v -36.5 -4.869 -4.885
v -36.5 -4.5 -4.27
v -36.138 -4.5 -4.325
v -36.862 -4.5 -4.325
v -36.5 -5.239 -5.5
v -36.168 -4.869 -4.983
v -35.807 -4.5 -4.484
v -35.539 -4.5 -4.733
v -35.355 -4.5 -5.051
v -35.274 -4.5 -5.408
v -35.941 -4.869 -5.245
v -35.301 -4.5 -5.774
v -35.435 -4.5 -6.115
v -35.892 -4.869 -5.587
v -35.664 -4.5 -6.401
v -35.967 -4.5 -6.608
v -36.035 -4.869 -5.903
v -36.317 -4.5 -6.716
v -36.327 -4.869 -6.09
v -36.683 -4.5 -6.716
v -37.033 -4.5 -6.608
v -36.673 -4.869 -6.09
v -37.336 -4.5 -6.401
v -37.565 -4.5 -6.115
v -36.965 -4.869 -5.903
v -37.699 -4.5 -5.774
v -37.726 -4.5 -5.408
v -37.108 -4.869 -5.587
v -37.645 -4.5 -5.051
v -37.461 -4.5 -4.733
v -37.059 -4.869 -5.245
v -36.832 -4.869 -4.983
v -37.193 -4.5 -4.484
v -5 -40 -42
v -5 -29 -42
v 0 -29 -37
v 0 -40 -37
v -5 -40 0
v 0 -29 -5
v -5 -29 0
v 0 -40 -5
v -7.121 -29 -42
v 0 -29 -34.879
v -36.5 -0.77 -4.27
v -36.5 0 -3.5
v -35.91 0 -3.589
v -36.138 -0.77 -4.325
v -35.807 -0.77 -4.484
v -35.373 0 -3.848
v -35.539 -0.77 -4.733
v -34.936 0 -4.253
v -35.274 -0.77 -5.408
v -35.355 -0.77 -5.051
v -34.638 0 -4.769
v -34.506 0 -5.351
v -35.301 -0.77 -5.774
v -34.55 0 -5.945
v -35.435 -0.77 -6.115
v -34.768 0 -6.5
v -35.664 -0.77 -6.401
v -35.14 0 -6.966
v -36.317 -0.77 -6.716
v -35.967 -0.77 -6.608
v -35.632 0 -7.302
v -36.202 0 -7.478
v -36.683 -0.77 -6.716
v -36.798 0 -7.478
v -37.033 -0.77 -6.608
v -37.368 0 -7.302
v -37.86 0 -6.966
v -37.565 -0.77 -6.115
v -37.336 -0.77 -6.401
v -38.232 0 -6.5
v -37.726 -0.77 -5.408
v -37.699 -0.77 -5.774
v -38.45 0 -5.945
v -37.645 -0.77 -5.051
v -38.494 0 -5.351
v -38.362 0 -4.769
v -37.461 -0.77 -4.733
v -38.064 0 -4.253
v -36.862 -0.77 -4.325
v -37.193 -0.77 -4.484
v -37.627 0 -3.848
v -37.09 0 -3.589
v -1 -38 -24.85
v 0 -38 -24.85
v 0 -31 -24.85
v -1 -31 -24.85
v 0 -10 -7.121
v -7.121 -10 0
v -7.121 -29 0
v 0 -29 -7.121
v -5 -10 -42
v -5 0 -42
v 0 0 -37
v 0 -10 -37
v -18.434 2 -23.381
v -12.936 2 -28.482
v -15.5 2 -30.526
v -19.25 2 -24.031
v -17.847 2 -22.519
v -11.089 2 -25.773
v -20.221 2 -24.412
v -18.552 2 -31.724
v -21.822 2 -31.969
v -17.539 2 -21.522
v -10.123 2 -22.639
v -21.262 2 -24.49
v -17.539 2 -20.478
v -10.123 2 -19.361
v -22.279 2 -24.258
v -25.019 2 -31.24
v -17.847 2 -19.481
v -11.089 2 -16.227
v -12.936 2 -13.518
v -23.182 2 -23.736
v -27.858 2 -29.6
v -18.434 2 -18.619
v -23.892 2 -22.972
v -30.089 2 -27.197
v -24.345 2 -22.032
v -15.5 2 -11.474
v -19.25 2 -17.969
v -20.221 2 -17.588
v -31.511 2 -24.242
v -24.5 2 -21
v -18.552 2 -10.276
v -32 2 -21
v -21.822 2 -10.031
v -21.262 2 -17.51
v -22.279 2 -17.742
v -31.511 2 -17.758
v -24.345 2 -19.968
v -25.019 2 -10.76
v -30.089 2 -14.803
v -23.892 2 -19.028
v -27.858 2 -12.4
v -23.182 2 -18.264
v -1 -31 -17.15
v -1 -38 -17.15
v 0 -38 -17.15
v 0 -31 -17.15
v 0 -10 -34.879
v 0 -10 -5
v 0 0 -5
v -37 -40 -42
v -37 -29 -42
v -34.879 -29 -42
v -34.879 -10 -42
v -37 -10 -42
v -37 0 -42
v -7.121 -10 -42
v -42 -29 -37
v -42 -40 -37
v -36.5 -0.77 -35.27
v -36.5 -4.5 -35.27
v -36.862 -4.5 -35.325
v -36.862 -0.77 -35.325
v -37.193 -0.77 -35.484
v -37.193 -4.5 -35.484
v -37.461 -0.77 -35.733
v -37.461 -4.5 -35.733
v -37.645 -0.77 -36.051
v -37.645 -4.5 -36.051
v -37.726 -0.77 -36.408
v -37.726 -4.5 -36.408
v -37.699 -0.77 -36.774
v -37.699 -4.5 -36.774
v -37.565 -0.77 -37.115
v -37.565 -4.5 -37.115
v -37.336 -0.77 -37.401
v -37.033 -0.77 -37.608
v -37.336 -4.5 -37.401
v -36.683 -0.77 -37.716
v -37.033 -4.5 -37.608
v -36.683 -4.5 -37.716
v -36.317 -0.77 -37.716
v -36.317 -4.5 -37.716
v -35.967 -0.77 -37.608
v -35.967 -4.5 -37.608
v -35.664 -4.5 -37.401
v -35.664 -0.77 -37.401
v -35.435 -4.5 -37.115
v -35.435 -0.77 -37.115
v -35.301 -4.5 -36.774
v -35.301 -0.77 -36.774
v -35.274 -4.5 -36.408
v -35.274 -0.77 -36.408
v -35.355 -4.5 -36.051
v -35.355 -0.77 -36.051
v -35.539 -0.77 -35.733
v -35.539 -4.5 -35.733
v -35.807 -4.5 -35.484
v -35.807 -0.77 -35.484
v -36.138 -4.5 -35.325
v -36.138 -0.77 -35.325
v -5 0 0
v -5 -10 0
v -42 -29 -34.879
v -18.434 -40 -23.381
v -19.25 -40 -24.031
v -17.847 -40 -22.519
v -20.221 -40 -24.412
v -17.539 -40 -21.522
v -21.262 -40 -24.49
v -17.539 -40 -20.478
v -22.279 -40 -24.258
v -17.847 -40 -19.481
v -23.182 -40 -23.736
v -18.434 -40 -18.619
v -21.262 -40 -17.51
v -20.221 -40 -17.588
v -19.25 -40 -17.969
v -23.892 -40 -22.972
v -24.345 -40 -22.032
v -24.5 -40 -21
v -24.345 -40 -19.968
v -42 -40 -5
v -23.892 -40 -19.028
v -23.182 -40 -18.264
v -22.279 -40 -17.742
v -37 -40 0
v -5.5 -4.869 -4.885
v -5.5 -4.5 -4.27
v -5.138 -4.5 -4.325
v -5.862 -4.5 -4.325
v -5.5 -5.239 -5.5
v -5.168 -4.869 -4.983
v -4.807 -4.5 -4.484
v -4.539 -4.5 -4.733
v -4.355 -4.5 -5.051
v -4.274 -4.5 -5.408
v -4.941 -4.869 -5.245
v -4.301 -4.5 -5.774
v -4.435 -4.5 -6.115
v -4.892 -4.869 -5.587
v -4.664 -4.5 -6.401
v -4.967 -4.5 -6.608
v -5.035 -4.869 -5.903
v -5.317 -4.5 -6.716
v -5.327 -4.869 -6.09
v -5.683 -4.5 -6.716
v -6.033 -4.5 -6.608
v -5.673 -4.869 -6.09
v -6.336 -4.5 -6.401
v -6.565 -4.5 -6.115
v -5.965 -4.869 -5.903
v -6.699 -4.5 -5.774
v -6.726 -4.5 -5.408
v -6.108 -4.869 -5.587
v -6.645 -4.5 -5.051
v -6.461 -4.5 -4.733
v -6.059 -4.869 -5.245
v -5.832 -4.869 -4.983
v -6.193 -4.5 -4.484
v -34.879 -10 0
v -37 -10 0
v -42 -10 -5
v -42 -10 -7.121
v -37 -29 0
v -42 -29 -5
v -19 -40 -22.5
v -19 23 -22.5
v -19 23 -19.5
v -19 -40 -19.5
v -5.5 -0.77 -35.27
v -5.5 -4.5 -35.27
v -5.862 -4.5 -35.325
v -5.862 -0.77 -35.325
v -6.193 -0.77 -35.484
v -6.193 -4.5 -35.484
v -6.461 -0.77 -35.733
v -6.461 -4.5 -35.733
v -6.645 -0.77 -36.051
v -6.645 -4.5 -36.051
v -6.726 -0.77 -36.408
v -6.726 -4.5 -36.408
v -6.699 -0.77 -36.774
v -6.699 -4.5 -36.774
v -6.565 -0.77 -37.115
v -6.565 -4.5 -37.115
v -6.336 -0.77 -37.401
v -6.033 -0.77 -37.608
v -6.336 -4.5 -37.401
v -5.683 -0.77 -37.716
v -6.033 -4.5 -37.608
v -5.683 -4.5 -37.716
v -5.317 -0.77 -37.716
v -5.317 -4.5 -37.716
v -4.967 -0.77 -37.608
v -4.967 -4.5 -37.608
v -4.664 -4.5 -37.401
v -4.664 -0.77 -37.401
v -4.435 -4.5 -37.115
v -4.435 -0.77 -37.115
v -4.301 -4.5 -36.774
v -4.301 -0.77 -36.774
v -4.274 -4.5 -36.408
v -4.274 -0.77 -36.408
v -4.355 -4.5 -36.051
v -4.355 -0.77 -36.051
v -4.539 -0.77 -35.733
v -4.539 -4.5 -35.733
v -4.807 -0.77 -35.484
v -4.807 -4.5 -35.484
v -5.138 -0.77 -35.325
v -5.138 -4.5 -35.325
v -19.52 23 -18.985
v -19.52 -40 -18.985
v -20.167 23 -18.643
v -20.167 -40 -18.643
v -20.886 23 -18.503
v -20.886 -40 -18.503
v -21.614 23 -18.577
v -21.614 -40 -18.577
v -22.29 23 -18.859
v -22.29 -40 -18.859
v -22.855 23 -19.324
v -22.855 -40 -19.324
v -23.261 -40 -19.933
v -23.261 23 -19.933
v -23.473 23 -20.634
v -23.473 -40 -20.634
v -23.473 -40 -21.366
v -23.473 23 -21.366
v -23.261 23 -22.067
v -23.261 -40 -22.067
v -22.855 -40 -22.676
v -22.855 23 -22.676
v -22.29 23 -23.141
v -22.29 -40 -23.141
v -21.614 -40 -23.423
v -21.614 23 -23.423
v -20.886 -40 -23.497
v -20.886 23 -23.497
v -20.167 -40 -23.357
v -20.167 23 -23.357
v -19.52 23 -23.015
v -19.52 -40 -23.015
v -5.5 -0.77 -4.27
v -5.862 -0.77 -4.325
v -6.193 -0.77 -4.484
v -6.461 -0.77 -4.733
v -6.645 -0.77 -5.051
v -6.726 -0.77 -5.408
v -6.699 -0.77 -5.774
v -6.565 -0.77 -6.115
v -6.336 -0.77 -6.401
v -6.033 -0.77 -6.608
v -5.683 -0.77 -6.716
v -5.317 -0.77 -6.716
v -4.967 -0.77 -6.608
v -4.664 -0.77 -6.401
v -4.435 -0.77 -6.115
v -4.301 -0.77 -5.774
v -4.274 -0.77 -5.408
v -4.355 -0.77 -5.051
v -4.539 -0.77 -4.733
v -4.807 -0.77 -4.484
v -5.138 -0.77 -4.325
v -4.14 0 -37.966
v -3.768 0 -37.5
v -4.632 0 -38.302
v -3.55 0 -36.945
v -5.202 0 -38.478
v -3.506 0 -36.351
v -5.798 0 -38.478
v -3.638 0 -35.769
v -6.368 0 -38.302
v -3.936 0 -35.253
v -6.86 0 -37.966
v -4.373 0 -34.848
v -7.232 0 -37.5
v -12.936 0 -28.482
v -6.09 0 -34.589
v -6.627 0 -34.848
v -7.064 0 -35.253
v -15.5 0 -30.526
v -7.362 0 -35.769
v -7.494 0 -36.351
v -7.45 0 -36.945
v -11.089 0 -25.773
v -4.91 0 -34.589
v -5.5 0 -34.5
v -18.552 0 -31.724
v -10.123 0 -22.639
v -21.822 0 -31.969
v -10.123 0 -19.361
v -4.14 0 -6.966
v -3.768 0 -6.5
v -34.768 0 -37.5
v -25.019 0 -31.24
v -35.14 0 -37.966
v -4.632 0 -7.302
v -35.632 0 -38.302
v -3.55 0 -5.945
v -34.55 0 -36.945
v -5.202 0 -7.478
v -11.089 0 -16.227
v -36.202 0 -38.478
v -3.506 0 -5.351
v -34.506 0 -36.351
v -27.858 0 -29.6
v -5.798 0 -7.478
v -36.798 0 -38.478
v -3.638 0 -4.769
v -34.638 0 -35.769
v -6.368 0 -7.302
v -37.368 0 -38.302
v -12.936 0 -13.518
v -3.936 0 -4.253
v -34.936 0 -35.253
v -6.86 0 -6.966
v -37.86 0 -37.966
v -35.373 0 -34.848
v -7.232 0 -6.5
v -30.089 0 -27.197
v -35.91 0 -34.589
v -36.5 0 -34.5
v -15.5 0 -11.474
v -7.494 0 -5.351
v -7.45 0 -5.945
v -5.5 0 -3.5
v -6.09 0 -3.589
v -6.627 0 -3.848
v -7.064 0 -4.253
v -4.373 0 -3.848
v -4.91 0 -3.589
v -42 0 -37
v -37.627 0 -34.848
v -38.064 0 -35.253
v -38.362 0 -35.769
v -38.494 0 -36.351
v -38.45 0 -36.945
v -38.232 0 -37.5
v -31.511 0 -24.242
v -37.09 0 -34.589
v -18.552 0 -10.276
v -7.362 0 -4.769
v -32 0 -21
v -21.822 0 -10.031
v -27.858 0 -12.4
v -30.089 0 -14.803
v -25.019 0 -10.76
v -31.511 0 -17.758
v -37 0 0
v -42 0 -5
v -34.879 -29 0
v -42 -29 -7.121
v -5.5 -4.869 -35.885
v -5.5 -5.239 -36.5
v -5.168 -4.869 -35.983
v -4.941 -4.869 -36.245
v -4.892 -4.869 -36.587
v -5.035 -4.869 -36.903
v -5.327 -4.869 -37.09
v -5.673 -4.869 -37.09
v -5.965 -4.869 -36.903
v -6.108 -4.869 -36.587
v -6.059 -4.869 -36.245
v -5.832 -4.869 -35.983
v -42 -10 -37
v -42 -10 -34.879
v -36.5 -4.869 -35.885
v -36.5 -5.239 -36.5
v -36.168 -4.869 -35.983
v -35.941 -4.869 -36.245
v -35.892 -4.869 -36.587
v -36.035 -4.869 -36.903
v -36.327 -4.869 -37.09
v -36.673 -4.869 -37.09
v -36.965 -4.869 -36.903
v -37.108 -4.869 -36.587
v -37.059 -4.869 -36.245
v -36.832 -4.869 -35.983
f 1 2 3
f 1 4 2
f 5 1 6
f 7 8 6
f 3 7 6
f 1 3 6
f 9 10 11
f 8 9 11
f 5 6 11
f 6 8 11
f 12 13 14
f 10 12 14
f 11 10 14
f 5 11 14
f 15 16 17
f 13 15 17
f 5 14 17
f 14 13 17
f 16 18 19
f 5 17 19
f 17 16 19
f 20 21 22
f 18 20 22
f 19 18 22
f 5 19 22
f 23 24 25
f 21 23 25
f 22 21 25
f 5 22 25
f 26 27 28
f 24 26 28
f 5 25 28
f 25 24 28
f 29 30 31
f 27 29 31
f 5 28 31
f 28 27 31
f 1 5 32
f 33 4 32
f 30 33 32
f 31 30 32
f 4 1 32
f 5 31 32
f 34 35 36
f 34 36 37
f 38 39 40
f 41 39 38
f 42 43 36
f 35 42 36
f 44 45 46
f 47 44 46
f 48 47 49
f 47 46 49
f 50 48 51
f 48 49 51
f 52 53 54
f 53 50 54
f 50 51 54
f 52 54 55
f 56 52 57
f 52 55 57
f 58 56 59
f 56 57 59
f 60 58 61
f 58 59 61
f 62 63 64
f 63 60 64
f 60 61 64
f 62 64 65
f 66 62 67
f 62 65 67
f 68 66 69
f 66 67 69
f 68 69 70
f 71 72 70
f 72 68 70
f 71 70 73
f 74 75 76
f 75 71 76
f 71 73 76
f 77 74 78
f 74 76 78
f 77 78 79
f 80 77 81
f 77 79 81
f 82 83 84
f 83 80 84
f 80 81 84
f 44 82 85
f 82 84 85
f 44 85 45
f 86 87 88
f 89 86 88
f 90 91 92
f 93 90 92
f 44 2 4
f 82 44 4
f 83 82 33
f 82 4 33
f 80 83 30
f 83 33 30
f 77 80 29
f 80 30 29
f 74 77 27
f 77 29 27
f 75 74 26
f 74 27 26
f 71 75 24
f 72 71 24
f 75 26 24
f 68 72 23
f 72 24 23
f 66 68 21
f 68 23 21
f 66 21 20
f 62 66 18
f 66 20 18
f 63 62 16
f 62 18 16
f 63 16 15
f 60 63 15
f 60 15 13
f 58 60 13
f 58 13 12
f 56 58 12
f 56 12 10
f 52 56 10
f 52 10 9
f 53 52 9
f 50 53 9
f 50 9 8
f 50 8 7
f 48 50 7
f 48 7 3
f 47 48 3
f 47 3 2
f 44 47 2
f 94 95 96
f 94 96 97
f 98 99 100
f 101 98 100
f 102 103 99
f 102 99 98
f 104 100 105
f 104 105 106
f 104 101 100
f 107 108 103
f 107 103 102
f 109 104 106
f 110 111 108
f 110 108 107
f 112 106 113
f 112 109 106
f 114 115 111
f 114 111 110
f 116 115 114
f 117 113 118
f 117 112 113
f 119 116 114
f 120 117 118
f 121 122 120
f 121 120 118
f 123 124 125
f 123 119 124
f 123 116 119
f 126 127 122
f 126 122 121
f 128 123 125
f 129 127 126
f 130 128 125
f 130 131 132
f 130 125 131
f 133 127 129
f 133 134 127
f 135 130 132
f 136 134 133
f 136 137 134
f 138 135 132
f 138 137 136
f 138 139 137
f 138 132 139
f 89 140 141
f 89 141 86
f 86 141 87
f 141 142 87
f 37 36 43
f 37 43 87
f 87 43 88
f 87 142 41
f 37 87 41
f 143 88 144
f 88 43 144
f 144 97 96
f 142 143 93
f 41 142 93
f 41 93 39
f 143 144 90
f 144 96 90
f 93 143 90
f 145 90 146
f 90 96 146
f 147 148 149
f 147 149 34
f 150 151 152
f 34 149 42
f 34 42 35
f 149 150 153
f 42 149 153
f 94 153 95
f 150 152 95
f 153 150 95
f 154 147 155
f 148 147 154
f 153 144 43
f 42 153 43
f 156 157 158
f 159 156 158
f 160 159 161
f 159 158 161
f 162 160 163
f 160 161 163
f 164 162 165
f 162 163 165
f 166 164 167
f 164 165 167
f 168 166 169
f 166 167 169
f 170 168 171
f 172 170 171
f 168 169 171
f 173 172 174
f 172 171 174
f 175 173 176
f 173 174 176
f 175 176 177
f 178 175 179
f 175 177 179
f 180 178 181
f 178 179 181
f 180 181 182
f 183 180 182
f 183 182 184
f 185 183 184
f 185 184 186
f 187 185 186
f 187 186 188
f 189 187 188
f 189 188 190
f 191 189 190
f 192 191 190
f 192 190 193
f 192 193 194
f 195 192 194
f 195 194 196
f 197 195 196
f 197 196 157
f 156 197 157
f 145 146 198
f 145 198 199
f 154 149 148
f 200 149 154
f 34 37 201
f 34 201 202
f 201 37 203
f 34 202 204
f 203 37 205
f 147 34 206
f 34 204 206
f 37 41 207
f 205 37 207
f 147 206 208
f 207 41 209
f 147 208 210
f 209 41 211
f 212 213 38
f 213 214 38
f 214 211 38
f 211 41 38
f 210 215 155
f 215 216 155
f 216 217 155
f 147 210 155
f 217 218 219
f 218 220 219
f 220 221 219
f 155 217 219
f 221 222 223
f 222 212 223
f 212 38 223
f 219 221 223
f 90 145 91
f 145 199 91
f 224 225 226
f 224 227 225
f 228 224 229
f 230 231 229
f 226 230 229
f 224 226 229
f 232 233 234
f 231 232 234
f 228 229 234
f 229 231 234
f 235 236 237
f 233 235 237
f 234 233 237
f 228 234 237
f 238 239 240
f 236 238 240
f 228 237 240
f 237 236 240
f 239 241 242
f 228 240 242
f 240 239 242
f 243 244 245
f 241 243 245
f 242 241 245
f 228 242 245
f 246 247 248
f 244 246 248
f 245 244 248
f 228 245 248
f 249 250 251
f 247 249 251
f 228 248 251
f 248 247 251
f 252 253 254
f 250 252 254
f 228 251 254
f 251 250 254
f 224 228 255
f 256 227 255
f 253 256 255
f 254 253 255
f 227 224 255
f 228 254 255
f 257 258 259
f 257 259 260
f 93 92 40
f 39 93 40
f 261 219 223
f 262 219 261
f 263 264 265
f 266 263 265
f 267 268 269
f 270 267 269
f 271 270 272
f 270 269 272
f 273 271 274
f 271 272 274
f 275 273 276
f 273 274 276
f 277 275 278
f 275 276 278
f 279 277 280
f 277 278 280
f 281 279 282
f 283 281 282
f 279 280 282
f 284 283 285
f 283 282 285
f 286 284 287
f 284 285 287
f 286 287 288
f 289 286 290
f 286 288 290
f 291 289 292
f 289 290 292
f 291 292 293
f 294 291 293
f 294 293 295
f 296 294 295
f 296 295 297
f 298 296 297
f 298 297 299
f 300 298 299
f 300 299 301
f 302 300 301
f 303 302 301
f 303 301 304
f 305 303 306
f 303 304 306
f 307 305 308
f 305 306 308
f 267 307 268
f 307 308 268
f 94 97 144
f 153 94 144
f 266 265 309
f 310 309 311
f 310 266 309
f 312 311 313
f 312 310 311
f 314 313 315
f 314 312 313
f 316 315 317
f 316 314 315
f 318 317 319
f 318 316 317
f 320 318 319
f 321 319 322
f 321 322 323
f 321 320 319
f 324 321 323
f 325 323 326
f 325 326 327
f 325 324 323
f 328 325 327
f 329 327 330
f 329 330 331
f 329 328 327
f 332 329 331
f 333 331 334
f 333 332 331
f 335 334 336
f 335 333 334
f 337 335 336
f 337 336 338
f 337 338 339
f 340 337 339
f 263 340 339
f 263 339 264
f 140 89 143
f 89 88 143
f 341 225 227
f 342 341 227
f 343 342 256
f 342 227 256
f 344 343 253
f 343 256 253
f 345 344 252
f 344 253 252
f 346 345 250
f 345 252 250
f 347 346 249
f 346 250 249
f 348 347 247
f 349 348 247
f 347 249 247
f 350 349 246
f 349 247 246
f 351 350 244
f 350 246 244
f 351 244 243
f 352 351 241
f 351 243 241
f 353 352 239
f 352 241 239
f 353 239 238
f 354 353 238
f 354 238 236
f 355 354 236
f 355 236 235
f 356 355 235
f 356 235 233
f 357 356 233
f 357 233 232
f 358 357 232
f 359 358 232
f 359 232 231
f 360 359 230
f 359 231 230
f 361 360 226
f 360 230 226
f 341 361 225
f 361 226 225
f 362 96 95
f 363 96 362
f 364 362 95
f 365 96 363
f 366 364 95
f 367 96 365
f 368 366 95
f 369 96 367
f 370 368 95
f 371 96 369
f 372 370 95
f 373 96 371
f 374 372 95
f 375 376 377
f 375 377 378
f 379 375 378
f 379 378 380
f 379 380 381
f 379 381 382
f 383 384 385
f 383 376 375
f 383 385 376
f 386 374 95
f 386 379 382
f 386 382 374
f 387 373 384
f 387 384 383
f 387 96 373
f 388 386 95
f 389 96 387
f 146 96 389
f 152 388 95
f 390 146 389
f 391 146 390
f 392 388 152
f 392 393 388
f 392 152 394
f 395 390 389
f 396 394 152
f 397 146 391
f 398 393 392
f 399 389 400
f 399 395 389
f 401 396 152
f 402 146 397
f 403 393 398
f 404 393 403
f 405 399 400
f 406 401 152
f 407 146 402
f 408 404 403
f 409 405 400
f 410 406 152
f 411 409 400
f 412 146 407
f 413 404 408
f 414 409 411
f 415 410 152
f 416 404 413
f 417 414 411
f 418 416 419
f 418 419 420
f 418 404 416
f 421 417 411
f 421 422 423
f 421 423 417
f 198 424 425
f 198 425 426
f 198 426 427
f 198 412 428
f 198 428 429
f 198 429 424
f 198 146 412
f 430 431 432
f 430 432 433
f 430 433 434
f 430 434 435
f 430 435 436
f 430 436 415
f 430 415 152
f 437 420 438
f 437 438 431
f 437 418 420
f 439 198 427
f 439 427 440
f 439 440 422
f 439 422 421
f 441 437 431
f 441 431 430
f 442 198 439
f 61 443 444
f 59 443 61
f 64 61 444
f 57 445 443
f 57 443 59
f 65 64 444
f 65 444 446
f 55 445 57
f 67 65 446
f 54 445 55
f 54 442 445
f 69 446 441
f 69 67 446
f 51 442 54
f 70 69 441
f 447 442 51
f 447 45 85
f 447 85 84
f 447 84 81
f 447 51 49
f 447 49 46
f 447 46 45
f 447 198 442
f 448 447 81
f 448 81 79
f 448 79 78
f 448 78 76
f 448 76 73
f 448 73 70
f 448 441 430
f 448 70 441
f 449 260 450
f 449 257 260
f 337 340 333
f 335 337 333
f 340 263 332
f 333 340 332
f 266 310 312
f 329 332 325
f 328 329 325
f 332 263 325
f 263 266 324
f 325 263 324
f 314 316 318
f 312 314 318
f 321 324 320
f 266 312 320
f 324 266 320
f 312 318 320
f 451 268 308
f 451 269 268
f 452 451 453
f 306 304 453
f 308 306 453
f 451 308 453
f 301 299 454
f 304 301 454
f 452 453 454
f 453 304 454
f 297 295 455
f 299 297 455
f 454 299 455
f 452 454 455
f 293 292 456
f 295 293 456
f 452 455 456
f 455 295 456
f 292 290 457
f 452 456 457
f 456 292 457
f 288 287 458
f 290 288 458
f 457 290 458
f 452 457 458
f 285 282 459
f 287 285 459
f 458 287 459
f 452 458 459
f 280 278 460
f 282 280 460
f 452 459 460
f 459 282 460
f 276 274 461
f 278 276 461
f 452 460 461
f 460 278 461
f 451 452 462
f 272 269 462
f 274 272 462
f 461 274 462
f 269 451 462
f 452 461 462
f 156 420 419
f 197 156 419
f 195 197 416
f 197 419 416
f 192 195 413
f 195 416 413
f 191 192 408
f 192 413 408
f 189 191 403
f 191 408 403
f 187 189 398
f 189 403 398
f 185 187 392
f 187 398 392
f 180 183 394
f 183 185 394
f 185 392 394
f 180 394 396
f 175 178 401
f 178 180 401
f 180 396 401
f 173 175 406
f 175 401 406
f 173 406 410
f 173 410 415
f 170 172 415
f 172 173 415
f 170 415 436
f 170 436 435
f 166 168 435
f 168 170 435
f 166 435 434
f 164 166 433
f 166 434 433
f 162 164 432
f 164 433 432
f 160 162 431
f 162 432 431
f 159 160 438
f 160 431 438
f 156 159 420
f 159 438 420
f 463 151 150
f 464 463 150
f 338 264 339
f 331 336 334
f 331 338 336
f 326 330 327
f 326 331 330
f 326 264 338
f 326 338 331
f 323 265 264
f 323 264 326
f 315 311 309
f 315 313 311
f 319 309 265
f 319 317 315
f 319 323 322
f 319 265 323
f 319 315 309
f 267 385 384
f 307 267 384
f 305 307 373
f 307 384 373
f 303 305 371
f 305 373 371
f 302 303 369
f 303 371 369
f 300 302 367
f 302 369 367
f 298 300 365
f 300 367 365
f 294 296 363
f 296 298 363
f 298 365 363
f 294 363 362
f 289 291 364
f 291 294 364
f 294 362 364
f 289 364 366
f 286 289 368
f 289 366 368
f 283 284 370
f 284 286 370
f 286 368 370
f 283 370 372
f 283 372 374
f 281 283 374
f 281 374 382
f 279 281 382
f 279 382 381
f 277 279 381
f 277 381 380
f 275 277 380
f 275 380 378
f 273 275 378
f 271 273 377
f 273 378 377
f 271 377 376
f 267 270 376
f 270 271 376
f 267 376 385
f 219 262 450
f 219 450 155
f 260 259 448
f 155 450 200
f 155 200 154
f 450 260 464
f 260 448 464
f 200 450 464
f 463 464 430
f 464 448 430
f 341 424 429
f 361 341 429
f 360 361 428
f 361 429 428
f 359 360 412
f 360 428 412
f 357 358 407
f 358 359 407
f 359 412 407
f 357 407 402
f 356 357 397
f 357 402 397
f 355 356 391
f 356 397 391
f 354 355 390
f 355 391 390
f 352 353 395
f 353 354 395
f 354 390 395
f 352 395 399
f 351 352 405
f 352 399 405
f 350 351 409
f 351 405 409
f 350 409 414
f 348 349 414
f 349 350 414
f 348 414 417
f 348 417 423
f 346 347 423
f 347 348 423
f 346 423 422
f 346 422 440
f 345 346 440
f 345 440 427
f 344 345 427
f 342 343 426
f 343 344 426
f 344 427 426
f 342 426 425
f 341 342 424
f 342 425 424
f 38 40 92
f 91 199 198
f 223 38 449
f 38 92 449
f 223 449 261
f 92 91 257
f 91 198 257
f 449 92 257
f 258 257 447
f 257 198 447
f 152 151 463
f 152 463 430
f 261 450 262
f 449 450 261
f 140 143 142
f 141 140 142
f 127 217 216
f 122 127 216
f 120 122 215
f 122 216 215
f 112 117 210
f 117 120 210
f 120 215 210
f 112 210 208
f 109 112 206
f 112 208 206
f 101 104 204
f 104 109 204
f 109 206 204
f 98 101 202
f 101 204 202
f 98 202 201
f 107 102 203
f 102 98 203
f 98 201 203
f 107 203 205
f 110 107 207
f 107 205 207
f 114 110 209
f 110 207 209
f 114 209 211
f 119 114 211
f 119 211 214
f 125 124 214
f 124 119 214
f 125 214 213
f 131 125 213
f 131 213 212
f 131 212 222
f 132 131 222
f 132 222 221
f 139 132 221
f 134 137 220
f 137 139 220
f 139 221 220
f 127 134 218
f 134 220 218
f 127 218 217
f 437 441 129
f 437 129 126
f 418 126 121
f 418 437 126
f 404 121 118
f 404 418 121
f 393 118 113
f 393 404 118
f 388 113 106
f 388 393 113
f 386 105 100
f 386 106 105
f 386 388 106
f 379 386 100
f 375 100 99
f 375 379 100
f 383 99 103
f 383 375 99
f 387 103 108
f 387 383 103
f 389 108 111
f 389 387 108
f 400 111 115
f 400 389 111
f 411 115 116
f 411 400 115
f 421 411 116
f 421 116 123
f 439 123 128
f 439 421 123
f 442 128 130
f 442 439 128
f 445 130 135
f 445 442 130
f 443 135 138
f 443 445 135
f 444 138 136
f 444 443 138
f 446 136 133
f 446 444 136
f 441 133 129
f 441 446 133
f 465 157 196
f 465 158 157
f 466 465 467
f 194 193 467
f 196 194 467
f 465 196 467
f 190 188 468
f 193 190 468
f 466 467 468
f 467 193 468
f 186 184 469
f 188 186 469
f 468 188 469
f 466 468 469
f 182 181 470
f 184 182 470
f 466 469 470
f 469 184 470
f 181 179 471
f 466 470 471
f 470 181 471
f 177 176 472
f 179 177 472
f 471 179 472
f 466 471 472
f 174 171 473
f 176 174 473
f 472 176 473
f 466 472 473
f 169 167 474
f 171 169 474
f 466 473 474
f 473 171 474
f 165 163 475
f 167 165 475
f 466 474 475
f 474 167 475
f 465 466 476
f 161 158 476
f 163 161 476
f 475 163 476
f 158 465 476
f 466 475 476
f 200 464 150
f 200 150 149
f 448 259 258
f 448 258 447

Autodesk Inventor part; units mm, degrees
ref_plane "YZ Plane" through (0, 0, 0) normal (1, 0, 0) x (0, 1, 0)
sketch "Sketch2" plane through (0, 0, 0) normal (0, 1, 0) x (-1, 0, 0)
  line L0 (0, 0) -> (42, 0)
  line L1 (42, 0) -> (42, -42)
  line L2 (42, -42) -> (0, -42)
  line L3 (0, -42) -> (0, 0)
  circle A0 centre (21, -21) radius 11
  circle A1 centre (21, -21) radius 3.5
  circle A2 centre (21, -21) radius 2.5
  point P0 (5.5, -5.5)
  point P1 (5.5, -36.5)
  point P2 (36.5, -36.5)
  point P3 (36.5, -5.5)
  dimension "d15" = 42
  dimension "d16" = 42
  dimension "d17" = 22
  dimension "d18" = 7
  dimension "d19" = 5
extrude "Extrusion3" add sketch "Sketch2" against normal blind 40 contours L0 L1 L2 L3 | A0
extrude "Extrusion4" add sketch "Sketch2" along normal blind 2 contours A0
hole "Hole1" at (-36.5, 0, -5.5) at (-36.5, 0, -36.5) at (-5.5, 0, -36.5) at (-5.5, 0, -5.5) direction (0, -1, 0) diameter 2.459 depth 4.5 tip angle 118 countersink diameter 4 countersink angle 90 thread size "M3x0.5" class "6H" standard "ANSI Metric M Profile"
chamfer "Chamfer1" distance 5 angle 45 4 edges at (-42, -20, 0) (0, -20, 0) (-42, -20, -42) (0, -20, -42)
ref_plane "Work Plane1" through (-5, 0, 0) normal (0.7071068, 0, 0.7071068) x (0.7071068, 0, -0.7071068)
sketch "Sketch3" plane through (-5, 0, 0) normal (0.7071068, 0, 0.7071068) x (0.7071068, 0, -0.7071068)
  line L0 (0, 0) -> (0, -40) projected
  line L1 (-22.6274, 0) -> (0, 0) projected
  line L2 (-22.6274, -40) -> (-22.6274, 0) projected
  line L3 (0, -40) -> (-22.6274, -40) projected
  line L4 (29.6985, 0) -> (29.6985, -40) projected
  line L5 (7.0711, 0) -> (29.6985, 0) projected
  line L6 (7.0711, -40) -> (7.0711, 0) projected
  line L7 (29.6985, -40) -> (7.0711, -40) projected
  line L8 (29.6985, -40) -> (29.6985, 0) projected
  line L9 (29.6985, -10) -> (28.1985, -10)
  line L10 (28.1985, -10) -> (28.1985, -29)
  line L11 (28.1985, -29) -> (29.6985, -29)
  line L12 (29.6985, -29) -> (29.6985, -10)
  line L13 (-22.6274, 0) -> (-22.6274, -40) projected
  line L14 (-22.6274, -10) -> (-21.1274, -10)
  line L15 (-21.1274, -10) -> (-21.1274, -29)
  line L16 (-21.1274, -29) -> (-22.6274, -29)
  line L17 (-22.6274, -29) -> (-22.6274, -10)
  point P0 (3.5355, 0)
  dimension "d36" = 1.5
  dimension "d50" = 1.5
extrude "Extrusion5" cut sketch "Sketch3" against normal through all contours L14 L15 L16 L2 | L4 L11 L10 L9
ref_plane "Work Plane2" through (-42, 0, -5) normal (-0.7071068, 0, 0.7071068) x (0.7071068, 0, 0.7071068)
sketch "Sketch4" plane through (-42, 0, -5) normal (-0.7071068, 0, 0.7071068) x (0.7071068, 0, 0.7071068)
  line L0 (-22.6274, -40) -> (-22.6274, 0) projected
  line L1 (0, -40) -> (-22.6274, -40) projected
  line L2 (0, 0) -> (0, -10) projected
  line L3 (-22.6274, 0) -> (0, 0) projected
  line L4 (29.6985, 0) -> (29.6985, -40) projected
  line L5 (7.0711, 0) -> (29.6985, 0) projected
  line L6 (7.0711, -40) -> (7.0711, -29) projected
  line L7 (29.6985, -40) -> (7.0711, -40) projected
  line L8 (-22.6274, -10) -> (-21.1274, -10)
  line L9 (-21.1274, -10) -> (-21.1274, -29)
  line L10 (-21.1274, -29) -> (-22.6274, -29)
  line L11 (-22.6274, -29) -> (-22.6274, -10)
  line L12 (29.6985, -40) -> (29.6985, 0) projected
  line L13 (29.6985, -10) -> (28.1985, -10)
  line L14 (28.1985, -10) -> (28.1985, -29)
  line L15 (28.1985, -29) -> (29.6985, -29)
  line L16 (29.6985, -29) -> (29.6985, -10)
  line L17 (0, -29) -> (-1.5, -29) projected
  line L18 (-1.5, -29) -> (-1.5, -10) projected
  line L19 (-1.5, -10) -> (0, -10) projected
  line L20 (0, -29) -> (0, -40) projected
  line L21 (7.0711, -10) -> (8.5711, -10) projected
  line L22 (8.5711, -10) -> (8.5711, -29) projected
  line L23 (8.5711, -29) -> (7.0711, -29) projected
  line L24 (7.0711, -10) -> (7.0711, 0) projected
  point P0 (33.234, 0)
  point P1 (29.6985, -10)
  dimension "d39" = 1.5
  dimension "d40" = 1.5
extrude "Extrusion6" cut sketch "Sketch4" against normal through all contours L0 L8 L9 L10 | L4 L15 L14 L13
extrude "Extrusion7" add sketch "Sketch2" against normal up to surface (40 mm away) contours A2
extrude "Extrusion8" add sketch "Sketch2" along normal blind 23 contours A2
sketch "Sketch5" plane through (-21, 23, -21) normal (0, 1, 0) x (1, 0, 0)
  circle A0 centre (0, 0) radius 2.5 projected
  circle A1 centre (0, 0) radius 2.5 projected
  line L0 (-2.5, 0) -> (2, 0)
  line L1 (2, 1.5) -> (2, -1.5)
  point P0 (21, -21)
  point P1 (2, -1.5)
  point P2 (2, 1.5)
  dimension "d47" = 4.5
extrude "Extrusion9" cut sketch "Sketch5" against normal through all contours A0 L1
sketch "Sketch6" plane through (0, 0, -5) normal (1, 0, 0) x (0, 0, -1)
  line L0 (12.15, -38) -> (19.85, -38)
  line L1 (19.85, -38) -> (19.85, -31)
  line L2 (19.85, -31) -> (12.15, -31)
  line L3 (12.15, -31) -> (12.15, -38)
  point P0 (-5, 0)
  dimension "d51" = 7.7
  dimension "d52" = 7
extrude "Extrusion10" cut sketch "Sketch6" against normal blind 1
properties part number "motor"
